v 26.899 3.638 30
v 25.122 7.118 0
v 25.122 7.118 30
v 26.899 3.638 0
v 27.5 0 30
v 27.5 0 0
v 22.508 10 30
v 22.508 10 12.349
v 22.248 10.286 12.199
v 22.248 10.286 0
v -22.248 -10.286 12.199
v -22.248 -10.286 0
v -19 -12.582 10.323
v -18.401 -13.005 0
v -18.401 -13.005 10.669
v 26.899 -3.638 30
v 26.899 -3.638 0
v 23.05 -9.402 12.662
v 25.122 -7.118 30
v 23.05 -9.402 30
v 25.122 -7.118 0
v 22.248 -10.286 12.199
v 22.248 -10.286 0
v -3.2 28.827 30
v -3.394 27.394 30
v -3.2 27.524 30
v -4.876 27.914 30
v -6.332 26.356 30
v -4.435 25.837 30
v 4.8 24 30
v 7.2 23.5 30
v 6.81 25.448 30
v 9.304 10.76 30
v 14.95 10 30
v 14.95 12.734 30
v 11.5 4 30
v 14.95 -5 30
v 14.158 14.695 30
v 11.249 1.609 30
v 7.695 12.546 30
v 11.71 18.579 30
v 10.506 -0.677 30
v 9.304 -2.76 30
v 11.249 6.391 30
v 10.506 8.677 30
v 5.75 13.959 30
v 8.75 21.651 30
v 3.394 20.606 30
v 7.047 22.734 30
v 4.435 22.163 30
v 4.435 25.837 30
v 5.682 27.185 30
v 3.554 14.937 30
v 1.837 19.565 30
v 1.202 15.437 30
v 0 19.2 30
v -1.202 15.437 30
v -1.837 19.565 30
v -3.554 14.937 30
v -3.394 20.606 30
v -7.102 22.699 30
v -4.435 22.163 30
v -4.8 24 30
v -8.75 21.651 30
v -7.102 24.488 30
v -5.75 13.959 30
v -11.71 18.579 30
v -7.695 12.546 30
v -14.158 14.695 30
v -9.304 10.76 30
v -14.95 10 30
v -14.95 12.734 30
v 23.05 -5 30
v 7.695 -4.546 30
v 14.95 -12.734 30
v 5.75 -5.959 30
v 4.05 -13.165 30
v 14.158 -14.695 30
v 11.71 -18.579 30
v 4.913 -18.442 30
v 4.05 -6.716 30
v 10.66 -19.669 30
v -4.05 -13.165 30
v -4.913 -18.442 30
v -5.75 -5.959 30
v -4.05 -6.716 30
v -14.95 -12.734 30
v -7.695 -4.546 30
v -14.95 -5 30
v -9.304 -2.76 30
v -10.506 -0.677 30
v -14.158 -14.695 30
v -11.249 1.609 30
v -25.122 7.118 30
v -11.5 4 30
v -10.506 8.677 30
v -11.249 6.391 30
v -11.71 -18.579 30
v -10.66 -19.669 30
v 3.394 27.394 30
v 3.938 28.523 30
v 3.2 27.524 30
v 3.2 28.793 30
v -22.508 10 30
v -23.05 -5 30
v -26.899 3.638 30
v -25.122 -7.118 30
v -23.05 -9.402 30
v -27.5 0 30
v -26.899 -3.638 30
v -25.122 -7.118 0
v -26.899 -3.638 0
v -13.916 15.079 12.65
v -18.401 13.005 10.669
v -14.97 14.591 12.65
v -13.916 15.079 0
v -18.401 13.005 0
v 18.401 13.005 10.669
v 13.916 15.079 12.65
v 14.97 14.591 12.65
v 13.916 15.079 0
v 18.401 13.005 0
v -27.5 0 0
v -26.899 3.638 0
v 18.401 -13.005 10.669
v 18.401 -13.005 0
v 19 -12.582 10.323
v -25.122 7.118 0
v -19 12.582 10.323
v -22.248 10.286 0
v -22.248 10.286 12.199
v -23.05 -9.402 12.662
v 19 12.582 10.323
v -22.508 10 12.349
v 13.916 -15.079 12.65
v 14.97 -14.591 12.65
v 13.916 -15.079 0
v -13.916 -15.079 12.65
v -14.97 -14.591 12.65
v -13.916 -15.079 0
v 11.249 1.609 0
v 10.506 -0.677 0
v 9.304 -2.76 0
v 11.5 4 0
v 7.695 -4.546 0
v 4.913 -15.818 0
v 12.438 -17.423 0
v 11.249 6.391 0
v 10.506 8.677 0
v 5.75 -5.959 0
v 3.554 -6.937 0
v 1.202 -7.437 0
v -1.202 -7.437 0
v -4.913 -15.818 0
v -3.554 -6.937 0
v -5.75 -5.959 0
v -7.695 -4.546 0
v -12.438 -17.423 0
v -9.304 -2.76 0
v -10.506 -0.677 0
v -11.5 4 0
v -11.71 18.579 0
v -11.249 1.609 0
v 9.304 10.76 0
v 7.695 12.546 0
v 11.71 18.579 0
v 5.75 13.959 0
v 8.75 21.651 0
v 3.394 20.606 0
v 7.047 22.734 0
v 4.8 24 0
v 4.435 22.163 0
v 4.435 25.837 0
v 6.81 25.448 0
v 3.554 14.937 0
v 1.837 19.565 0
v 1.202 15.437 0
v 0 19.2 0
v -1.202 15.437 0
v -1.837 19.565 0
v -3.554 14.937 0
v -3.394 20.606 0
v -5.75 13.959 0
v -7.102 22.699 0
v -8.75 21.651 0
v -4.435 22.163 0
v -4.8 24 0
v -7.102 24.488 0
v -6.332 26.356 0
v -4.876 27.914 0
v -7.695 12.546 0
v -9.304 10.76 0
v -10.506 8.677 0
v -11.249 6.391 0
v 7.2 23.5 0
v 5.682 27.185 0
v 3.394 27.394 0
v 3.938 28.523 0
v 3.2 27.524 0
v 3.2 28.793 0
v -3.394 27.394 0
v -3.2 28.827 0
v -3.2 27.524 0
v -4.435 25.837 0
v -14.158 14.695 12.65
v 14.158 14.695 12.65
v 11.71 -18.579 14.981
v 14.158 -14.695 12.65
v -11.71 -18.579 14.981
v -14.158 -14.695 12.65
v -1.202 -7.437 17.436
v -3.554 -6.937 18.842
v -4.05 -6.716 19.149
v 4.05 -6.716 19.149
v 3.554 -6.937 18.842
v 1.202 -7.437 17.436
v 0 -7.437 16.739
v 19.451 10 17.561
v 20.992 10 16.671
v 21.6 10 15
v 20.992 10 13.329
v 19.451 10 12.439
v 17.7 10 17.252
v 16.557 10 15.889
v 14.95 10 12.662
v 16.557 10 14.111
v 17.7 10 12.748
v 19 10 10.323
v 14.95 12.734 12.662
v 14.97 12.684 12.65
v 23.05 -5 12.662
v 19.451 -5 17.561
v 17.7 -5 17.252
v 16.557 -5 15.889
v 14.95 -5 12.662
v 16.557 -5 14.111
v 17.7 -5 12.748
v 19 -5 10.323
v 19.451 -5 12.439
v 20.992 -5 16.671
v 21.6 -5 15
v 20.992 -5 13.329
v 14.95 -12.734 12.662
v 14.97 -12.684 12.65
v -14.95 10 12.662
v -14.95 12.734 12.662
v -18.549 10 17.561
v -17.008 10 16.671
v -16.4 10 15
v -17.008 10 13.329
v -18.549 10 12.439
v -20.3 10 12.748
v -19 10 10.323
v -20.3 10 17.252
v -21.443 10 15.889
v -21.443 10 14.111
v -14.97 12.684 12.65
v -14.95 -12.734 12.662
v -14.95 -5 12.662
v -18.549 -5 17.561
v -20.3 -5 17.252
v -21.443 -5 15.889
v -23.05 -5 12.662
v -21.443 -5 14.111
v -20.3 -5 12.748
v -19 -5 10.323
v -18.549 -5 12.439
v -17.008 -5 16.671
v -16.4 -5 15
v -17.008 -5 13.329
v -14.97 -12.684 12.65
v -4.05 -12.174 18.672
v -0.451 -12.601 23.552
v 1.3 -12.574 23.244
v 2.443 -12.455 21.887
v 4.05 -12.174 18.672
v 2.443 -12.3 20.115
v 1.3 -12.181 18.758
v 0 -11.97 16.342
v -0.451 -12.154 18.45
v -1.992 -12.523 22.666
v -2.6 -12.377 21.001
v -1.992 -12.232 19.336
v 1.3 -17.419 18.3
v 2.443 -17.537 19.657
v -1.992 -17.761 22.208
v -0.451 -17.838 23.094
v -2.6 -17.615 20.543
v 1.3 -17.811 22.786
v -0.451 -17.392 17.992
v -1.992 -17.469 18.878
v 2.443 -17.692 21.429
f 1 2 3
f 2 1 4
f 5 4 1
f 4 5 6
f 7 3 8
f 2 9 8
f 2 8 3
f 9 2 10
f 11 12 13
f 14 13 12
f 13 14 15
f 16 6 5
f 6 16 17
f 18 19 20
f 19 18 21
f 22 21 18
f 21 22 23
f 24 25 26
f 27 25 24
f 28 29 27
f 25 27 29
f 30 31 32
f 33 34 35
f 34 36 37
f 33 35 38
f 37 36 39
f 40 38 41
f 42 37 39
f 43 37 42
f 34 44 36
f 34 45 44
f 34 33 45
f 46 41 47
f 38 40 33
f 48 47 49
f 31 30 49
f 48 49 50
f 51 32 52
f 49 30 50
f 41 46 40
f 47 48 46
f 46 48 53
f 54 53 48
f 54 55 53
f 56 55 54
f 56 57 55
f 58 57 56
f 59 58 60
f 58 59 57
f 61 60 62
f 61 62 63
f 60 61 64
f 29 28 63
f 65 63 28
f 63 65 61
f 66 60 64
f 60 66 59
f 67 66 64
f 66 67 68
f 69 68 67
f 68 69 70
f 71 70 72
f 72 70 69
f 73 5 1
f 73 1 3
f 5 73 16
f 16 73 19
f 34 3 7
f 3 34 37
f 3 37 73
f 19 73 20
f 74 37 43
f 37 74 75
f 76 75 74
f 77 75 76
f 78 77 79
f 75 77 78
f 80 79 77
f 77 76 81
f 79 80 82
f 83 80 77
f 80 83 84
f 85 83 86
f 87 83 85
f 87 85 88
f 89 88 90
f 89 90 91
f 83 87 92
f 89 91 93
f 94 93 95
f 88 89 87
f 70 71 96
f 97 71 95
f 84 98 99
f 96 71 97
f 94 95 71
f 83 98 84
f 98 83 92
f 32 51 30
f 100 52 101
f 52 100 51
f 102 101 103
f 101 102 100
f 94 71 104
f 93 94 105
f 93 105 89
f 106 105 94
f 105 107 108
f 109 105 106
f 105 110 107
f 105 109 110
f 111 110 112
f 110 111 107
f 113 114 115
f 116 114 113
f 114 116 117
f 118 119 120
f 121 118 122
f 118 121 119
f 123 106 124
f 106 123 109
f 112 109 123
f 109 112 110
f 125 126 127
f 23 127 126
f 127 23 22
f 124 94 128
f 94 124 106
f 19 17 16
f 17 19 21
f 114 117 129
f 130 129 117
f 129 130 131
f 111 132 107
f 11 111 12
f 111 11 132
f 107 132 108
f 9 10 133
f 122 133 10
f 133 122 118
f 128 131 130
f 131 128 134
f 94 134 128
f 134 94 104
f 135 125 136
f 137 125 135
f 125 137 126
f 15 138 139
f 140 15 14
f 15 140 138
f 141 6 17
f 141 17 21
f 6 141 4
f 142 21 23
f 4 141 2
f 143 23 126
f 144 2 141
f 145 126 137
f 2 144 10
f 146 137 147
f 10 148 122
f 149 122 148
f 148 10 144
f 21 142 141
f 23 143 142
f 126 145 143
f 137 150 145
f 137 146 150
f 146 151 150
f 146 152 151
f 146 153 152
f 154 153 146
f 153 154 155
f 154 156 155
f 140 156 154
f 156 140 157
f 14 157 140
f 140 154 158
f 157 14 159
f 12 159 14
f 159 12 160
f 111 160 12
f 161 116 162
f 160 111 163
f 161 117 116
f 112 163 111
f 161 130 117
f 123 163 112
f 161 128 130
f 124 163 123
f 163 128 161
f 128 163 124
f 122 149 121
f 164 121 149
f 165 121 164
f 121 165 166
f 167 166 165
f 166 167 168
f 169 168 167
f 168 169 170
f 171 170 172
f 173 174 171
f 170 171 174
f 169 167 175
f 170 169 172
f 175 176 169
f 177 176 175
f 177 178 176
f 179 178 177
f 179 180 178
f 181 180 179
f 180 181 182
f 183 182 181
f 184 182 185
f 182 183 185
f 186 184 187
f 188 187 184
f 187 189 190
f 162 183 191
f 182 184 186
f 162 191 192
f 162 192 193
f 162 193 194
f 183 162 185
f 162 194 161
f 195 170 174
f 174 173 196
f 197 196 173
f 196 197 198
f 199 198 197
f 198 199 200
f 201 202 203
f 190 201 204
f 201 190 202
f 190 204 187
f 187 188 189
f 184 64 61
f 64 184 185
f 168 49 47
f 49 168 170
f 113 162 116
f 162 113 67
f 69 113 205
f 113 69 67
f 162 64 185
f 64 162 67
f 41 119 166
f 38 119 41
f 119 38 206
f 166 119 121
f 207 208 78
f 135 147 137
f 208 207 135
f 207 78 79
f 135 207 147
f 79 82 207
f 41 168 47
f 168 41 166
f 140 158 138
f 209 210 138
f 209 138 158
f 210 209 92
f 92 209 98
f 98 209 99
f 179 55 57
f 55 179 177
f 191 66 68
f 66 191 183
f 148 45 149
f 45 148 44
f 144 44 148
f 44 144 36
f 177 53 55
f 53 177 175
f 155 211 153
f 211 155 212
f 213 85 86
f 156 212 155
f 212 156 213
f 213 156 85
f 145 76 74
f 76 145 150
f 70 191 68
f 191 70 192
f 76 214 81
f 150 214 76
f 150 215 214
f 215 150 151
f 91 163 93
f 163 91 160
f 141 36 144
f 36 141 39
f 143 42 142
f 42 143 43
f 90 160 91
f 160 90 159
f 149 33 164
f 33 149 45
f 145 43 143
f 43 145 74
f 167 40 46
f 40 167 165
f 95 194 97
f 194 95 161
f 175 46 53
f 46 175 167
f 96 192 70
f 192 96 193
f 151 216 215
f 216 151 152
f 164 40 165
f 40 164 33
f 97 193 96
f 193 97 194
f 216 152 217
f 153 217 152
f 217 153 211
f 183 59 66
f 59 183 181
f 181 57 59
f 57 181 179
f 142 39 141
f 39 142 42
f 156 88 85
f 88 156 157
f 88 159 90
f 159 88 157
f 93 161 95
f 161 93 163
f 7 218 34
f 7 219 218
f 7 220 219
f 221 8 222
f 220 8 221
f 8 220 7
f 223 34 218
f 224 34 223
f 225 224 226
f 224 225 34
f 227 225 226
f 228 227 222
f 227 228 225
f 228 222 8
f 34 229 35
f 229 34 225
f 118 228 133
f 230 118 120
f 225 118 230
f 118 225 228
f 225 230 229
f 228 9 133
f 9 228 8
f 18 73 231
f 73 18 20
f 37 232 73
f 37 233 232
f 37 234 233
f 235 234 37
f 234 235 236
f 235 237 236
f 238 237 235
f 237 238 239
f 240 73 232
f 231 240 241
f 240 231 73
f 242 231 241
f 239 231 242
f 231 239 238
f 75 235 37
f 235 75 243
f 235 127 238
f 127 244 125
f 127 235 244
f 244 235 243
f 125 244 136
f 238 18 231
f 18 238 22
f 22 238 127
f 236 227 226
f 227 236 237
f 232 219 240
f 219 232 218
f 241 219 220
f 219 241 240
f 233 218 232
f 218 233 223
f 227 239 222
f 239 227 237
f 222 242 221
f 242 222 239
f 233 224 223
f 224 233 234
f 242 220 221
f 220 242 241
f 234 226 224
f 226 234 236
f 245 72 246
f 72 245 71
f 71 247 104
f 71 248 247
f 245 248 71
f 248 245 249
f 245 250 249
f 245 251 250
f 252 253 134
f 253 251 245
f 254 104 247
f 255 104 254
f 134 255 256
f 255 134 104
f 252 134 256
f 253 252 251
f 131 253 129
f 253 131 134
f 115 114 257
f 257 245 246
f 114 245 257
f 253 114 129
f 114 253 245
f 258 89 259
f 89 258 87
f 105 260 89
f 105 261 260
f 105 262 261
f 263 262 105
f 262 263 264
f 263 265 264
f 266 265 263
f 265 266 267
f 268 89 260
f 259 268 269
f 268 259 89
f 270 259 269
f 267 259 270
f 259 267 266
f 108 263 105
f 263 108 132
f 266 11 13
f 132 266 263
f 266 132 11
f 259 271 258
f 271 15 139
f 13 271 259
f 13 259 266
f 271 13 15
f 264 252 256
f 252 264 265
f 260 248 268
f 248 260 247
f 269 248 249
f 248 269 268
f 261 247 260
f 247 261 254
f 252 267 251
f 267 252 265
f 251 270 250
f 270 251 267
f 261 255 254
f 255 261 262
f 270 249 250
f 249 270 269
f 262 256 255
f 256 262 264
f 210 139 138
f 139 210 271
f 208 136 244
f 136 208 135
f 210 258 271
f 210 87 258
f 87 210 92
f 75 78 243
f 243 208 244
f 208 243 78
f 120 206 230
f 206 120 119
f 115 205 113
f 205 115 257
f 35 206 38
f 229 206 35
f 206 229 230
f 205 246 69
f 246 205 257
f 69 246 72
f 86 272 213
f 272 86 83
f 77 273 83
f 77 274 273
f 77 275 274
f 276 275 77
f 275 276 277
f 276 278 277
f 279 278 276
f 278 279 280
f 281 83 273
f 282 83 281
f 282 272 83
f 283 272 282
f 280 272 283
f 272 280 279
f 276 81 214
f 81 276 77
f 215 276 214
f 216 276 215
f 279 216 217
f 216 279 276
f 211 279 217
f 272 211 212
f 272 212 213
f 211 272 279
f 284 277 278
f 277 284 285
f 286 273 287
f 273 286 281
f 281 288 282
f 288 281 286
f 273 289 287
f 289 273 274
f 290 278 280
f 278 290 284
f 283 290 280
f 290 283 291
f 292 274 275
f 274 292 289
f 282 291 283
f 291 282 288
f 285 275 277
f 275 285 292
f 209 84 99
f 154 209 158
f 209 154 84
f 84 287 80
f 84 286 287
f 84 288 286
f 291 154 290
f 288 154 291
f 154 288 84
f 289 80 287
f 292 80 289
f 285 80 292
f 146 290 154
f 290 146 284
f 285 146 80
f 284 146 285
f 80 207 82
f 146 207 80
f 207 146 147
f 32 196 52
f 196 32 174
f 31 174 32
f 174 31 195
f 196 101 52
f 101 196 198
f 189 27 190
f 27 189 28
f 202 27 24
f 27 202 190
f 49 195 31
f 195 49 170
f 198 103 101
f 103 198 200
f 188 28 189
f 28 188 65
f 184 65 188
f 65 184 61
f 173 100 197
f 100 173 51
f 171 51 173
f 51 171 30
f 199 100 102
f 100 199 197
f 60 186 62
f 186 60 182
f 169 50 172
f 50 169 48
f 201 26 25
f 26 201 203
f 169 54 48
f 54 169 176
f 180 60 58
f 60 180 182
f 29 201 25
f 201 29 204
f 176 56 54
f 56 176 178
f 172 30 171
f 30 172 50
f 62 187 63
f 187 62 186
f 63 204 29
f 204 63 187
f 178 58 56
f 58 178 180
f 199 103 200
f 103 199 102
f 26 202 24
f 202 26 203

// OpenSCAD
// file: 3rdparty.scad
// -------------------------------
// 3rd party stuff
// -------------------------------




/*----------------------------------------------------------------------------*
* Defines common constants used throughout the AutoSCAD libraries.
*-----------------------------------------------------------------------------*
*----------------------------------------------------------------------------*/

//--- Constants

/** The value of Pi
 */
PI = 3.1415926535897932;

/** Printer resolution (in mm)
 */
RESOLUTION = 0.3;

/** Base size for objects (in mm)
 *
 * The library is designed to generate things in 'units' - this defines the
 * size of a unit (in mm).
 */
BASE_SIZE = 2;

//--- Modules

/** Create an isosceles triangle
 *
 * The middle of the base is at origin (0, 0, 0) and the tip of the triangle
 * points along the Y axis. Depth is in the Z axis and is centered on the
 * origin. If depth is not specified it defaults to 2 units.
 */
module triangle(width, height, depth = 2) {
  angle = atan(height / (width / 2));
  difference() {
    translate(v = [ 0, height / 2, 0 ]) {
      cube(size = [ width, height, depth ], center = true);
      }
    translate(v = [ width / 2, 0, 0 ]) {
      rotate(a = [ 0, 0, 90 - angle ]) {
        translate(v = [ width / 2, height, 0 ]) {
          cube(size = [ width, height * 2, depth * 2 ], center = true);
          }
        }
      }
    translate(v = [ -width / 2, 0, 0 ]) {
      rotate(a = [ 0, 0, 270 + angle ]) {
        translate(v = [ -width / 2, height, 0 ]) {
          cube(size = [ width, height * 2, depth * 2 ], center = true);
          }
        }
      }
    }
  }

/** Create an arc
 *
 * Creates a slice of a cylinder that is 'width' along the X axis, 'height'
 * along the Y axis and 'depth' along the Z axis. The base (the flat part)
 * is centered on the origin. If 'depth' is not specified it defaults to
 * 2 units.
 */
module arc(width, height, depth = 2) {
  radius = ((width * width) + (4 * height * height)) / (8 * height);
  difference() {
    translate(v = [ 0, -(radius - height), 0 ]) {
      cylinder(h = depth, r = radius, center = true, $fs = RESOLUTION);
      }
    translate(v = [ 0, -radius, 0 ]) {
      cube(size = [ radius * 2, radius * 2, depth * 2 ], center = true);
      }
    }
  }

/** Calculates the height of a teardrop with a given radius
 */
function teardrop_length(td_radius) = td_radius + sqrt(2 * (td_radius * td_radius));

/** Generate a teardrop shape
 *
 * These shapes are useful for minimising print volume while maintaining
 * structural strength.
 */
module teardrop(td_radius, td_height = 1) {
  translate(v = [ 0, -(teardrop_length(td_radius) - td_radius), 0 ]) {
    rotate(a = [ 0, 0, 45 ]) {
      linear_extrude(height = td_height) {
        union() {
          circle(r = td_radius, $fs = RESOLUTION);
          square(size = [ td_radius, td_radius ]);
          }
        }
      }
    }
  }

/** Variation of the teardrop with a specified length
 *
 * This module allows you to specify the length of the teardrop shape as well
 * as the radius.
 */
module teardrop_scaled(td_radius, td_length, td_height = 1) {
  scale_factor = td_length / teardrop_length(td_radius);
  scale(v = [ 1, scale_factor, 1 ]) {
    teardrop(td_radius, td_height);
    }
  }

/** Create a hexagon.
 *
 * The 'size' parameter specifies the distance from the center of the
 * hexagon to the center of one of the six straight edges. The 'depth'
 * parameter specifies the size in the Z axis. The resulting object
 * is centered on the origin.
 */
module hexagon(length, depth = 2) {
  width = 2 * length * tan(30);
  union() {
    cube(size = [ length * 2, width, depth ], center = true);
    rotate(a = [ 0, 0, 60 ]) {
      cube(size = [ length * 2, width, depth ], center = true);
      }
    rotate(a = [ 0, 0, -60 ]) {
      cube(size = [ length * 2, width, depth ], center = true);
      }
    }
  }

/** Create a hexagon
 *
 * The 'radius' parameter specifies the radius of the smallest circle
 * that contains the hexagon. The 'depth' parameter specifies the size
 * in the Z axis. The resulting object is centered on the origin.
 */
module hexagonR(radius, depth = 2) {
  hexagon(radius * cos(30), depth);
  }

/** Create a hexagon
 *
 * This version of the hexagon module creates a hexagon where each
 * edge is of 'part' length. The 'depth' parameter specifies the
 * size in the Z axis. The resulting object is centered on the
 * origin.
 */
module hexagonL(part, depth = 2) {
  hexagon((part / 2) / tan(30), depth);
  }

/** Create a rounded rectangle
 */
module roundrect(width, height, depth, radius) {
  union() {
    // Make the four corner pieces
    translate(v = [ width / 2 - radius, height / 2 - radius, 0 ]) {
      cylinder(r = radius, h = depth, center = true);
    }
    translate(v = [ width / 2 - radius, -(height / 2 - radius), 0 ]) {
      cylinder(r = radius, h = depth, center = true);
    }
    translate(v = [ -(width / 2 - radius), height / 2 - radius, 0 ]) {
      cylinder(r = radius, h = depth, center = true);
    }
     translate(v = [ -(width / 2 - radius), -(height / 2 - radius), 0 ]) {
       cylinder(r = radius, h = depth, center = true);
       }
    // Add the center rectangles
    cube(size = [ width - (2 * radius), height, depth ], center = true);
    cube(size = [ width, height - (2 * radius), depth ], center = true);
    }
  }
// file: modules.scad
use <3rdparty.scad>;

// module library

// tube - make a tube
//
// ro = outer radius
// ri = inner radius
// height = height
//
module tube(ro, ri, height) {
	difference() {
		cylinder(h=height, r=ro);
		cylinder(h=height, r=ri);
	}
}



// screwWithNut - draws a screw with nut. the object is placed
//                in z-direction centered at the origin
// 
// nr: radius of the nut
// nd: nut depth
// s:  space between nut and screen head
// sd: srew depth
// sr: screwRadius
// wp: with projection
// 
module screwWithNut(nr=5, nd=6.5, s=4, sd=6.5, sr=2.6, wp=0) {
	union() {
		translate([0, 0, sd/2]) hexagon(length = nr, depth = sd);
		translate([0, 0, sd]) cylinder(h=s, r=sr);
		translate([0, 0, s + nd/2 + sd]) hexagon(length = nr, depth = nd);
		if (wp > 0) {
			translate([-nr, 0, 0]) cube([2*nr, wp, sd]);
			translate([-nr, 0, s + sd]) cube([2*nr, wp, nd]);
		}
	}
}
// main file
// ---------------------------------------------------
// imports
// ---------------------------------------------------
use <modules.scad>;

// ---------------------------------------------------
// properties
// ---------------------------------------------------

// increase resolution
//$fn = 100;

nut_depth=4.05; // nut size for M5
screw_diameter=2.6;
min_border=4;
side_cw=2*min_border+2*nut_depth;
bottle_radius=47;
base_tube_radius=11.5;
base_tube_offset=4;


// ---------------------------------------------------
// shapes
// ---------------------------------------------------

_all();

//_front();
//_back();
//translate([0, 10, 0]) _back();


// test 
// translate([-2, -11.5, 11]) cube(4,4,4);


// ---------------------------------------------------
// modules
// ---------------------------------------------------

module _all() {
	difference() {
		union() {
			_base_fancy();
			translate([0, 23.5, 0]) scale([1.2, 1, 1]) cylinder(h=30, r=6);
		}
		translate([0, 24, 0]) cylinder(h=30, r=4.8);
		translate([-3.2, 24, 0]) cube([6.4, 6, 30]);
	}
}

module _front() {
	difference() {
		_all();
		translate([-50, 0, 0]) cube(100, 50, 40);
	}
}

module _back() {
	difference() {
		_all();
		translate([-50, -100, 0]) cube(100, 50, 40);
	}
}

module _base_fancy() {
	difference() {
		difference() {
			_base();
			_fancy();
			rotate(a=[0, 0, 180]) _fancy();			
		}
		rotate(a=[5, 0, 0]) translate([0, -6.5, 22]) _bottle();
	}
}

module _base(ro, ri, height) {
	difference() {
		union() {
			difference() {
				union() {
					scale([1.1, 0.7, 1]) cylinder(h=30, r=25);
					scale([0.7, 1, 1]) cylinder(h=30, r=25);
				}
				translate([0, base_tube_offset, 0]) cylinder(h=30, r=base_tube_radius);
			}
		}
		_nut(19, 15, -25, 30, 15, 15);
		_nut(-19, 15, -25, 30, 15, 15);
	}
}

module _bottle() {
	rotate(a=[0, 0, 180]) {
		union() {
			translate([0, bottle_radius+9, -25]) cylinder(h=50, r=bottle_radius);
			_nut(0, 0, -10, 40, 6);
		}
	}
}

module _nut(x=0, y=0, z=0, w=30, l=10, sdd=0) {
	rotate(a=[90, 0, 0]) {
		translate([x, y, z]) {
			screwWithNut(nr=nut_depth, nd=10, s=l, sd=sdd, st=screw_diameter, wp=w);
		}
	}
}

module _fancy() {
	translate([0, 0, 12.65]) difference() {
		cylinder(h=30, r=40);
		scale([0.7, 1, 1]) cylinder(h=30, r=25);
		translate([-50, -10, 0]) cube([100, 50, 50]);
	}
}



// ---------------------------------------------------
// trash
// ---------------------------------------------------
